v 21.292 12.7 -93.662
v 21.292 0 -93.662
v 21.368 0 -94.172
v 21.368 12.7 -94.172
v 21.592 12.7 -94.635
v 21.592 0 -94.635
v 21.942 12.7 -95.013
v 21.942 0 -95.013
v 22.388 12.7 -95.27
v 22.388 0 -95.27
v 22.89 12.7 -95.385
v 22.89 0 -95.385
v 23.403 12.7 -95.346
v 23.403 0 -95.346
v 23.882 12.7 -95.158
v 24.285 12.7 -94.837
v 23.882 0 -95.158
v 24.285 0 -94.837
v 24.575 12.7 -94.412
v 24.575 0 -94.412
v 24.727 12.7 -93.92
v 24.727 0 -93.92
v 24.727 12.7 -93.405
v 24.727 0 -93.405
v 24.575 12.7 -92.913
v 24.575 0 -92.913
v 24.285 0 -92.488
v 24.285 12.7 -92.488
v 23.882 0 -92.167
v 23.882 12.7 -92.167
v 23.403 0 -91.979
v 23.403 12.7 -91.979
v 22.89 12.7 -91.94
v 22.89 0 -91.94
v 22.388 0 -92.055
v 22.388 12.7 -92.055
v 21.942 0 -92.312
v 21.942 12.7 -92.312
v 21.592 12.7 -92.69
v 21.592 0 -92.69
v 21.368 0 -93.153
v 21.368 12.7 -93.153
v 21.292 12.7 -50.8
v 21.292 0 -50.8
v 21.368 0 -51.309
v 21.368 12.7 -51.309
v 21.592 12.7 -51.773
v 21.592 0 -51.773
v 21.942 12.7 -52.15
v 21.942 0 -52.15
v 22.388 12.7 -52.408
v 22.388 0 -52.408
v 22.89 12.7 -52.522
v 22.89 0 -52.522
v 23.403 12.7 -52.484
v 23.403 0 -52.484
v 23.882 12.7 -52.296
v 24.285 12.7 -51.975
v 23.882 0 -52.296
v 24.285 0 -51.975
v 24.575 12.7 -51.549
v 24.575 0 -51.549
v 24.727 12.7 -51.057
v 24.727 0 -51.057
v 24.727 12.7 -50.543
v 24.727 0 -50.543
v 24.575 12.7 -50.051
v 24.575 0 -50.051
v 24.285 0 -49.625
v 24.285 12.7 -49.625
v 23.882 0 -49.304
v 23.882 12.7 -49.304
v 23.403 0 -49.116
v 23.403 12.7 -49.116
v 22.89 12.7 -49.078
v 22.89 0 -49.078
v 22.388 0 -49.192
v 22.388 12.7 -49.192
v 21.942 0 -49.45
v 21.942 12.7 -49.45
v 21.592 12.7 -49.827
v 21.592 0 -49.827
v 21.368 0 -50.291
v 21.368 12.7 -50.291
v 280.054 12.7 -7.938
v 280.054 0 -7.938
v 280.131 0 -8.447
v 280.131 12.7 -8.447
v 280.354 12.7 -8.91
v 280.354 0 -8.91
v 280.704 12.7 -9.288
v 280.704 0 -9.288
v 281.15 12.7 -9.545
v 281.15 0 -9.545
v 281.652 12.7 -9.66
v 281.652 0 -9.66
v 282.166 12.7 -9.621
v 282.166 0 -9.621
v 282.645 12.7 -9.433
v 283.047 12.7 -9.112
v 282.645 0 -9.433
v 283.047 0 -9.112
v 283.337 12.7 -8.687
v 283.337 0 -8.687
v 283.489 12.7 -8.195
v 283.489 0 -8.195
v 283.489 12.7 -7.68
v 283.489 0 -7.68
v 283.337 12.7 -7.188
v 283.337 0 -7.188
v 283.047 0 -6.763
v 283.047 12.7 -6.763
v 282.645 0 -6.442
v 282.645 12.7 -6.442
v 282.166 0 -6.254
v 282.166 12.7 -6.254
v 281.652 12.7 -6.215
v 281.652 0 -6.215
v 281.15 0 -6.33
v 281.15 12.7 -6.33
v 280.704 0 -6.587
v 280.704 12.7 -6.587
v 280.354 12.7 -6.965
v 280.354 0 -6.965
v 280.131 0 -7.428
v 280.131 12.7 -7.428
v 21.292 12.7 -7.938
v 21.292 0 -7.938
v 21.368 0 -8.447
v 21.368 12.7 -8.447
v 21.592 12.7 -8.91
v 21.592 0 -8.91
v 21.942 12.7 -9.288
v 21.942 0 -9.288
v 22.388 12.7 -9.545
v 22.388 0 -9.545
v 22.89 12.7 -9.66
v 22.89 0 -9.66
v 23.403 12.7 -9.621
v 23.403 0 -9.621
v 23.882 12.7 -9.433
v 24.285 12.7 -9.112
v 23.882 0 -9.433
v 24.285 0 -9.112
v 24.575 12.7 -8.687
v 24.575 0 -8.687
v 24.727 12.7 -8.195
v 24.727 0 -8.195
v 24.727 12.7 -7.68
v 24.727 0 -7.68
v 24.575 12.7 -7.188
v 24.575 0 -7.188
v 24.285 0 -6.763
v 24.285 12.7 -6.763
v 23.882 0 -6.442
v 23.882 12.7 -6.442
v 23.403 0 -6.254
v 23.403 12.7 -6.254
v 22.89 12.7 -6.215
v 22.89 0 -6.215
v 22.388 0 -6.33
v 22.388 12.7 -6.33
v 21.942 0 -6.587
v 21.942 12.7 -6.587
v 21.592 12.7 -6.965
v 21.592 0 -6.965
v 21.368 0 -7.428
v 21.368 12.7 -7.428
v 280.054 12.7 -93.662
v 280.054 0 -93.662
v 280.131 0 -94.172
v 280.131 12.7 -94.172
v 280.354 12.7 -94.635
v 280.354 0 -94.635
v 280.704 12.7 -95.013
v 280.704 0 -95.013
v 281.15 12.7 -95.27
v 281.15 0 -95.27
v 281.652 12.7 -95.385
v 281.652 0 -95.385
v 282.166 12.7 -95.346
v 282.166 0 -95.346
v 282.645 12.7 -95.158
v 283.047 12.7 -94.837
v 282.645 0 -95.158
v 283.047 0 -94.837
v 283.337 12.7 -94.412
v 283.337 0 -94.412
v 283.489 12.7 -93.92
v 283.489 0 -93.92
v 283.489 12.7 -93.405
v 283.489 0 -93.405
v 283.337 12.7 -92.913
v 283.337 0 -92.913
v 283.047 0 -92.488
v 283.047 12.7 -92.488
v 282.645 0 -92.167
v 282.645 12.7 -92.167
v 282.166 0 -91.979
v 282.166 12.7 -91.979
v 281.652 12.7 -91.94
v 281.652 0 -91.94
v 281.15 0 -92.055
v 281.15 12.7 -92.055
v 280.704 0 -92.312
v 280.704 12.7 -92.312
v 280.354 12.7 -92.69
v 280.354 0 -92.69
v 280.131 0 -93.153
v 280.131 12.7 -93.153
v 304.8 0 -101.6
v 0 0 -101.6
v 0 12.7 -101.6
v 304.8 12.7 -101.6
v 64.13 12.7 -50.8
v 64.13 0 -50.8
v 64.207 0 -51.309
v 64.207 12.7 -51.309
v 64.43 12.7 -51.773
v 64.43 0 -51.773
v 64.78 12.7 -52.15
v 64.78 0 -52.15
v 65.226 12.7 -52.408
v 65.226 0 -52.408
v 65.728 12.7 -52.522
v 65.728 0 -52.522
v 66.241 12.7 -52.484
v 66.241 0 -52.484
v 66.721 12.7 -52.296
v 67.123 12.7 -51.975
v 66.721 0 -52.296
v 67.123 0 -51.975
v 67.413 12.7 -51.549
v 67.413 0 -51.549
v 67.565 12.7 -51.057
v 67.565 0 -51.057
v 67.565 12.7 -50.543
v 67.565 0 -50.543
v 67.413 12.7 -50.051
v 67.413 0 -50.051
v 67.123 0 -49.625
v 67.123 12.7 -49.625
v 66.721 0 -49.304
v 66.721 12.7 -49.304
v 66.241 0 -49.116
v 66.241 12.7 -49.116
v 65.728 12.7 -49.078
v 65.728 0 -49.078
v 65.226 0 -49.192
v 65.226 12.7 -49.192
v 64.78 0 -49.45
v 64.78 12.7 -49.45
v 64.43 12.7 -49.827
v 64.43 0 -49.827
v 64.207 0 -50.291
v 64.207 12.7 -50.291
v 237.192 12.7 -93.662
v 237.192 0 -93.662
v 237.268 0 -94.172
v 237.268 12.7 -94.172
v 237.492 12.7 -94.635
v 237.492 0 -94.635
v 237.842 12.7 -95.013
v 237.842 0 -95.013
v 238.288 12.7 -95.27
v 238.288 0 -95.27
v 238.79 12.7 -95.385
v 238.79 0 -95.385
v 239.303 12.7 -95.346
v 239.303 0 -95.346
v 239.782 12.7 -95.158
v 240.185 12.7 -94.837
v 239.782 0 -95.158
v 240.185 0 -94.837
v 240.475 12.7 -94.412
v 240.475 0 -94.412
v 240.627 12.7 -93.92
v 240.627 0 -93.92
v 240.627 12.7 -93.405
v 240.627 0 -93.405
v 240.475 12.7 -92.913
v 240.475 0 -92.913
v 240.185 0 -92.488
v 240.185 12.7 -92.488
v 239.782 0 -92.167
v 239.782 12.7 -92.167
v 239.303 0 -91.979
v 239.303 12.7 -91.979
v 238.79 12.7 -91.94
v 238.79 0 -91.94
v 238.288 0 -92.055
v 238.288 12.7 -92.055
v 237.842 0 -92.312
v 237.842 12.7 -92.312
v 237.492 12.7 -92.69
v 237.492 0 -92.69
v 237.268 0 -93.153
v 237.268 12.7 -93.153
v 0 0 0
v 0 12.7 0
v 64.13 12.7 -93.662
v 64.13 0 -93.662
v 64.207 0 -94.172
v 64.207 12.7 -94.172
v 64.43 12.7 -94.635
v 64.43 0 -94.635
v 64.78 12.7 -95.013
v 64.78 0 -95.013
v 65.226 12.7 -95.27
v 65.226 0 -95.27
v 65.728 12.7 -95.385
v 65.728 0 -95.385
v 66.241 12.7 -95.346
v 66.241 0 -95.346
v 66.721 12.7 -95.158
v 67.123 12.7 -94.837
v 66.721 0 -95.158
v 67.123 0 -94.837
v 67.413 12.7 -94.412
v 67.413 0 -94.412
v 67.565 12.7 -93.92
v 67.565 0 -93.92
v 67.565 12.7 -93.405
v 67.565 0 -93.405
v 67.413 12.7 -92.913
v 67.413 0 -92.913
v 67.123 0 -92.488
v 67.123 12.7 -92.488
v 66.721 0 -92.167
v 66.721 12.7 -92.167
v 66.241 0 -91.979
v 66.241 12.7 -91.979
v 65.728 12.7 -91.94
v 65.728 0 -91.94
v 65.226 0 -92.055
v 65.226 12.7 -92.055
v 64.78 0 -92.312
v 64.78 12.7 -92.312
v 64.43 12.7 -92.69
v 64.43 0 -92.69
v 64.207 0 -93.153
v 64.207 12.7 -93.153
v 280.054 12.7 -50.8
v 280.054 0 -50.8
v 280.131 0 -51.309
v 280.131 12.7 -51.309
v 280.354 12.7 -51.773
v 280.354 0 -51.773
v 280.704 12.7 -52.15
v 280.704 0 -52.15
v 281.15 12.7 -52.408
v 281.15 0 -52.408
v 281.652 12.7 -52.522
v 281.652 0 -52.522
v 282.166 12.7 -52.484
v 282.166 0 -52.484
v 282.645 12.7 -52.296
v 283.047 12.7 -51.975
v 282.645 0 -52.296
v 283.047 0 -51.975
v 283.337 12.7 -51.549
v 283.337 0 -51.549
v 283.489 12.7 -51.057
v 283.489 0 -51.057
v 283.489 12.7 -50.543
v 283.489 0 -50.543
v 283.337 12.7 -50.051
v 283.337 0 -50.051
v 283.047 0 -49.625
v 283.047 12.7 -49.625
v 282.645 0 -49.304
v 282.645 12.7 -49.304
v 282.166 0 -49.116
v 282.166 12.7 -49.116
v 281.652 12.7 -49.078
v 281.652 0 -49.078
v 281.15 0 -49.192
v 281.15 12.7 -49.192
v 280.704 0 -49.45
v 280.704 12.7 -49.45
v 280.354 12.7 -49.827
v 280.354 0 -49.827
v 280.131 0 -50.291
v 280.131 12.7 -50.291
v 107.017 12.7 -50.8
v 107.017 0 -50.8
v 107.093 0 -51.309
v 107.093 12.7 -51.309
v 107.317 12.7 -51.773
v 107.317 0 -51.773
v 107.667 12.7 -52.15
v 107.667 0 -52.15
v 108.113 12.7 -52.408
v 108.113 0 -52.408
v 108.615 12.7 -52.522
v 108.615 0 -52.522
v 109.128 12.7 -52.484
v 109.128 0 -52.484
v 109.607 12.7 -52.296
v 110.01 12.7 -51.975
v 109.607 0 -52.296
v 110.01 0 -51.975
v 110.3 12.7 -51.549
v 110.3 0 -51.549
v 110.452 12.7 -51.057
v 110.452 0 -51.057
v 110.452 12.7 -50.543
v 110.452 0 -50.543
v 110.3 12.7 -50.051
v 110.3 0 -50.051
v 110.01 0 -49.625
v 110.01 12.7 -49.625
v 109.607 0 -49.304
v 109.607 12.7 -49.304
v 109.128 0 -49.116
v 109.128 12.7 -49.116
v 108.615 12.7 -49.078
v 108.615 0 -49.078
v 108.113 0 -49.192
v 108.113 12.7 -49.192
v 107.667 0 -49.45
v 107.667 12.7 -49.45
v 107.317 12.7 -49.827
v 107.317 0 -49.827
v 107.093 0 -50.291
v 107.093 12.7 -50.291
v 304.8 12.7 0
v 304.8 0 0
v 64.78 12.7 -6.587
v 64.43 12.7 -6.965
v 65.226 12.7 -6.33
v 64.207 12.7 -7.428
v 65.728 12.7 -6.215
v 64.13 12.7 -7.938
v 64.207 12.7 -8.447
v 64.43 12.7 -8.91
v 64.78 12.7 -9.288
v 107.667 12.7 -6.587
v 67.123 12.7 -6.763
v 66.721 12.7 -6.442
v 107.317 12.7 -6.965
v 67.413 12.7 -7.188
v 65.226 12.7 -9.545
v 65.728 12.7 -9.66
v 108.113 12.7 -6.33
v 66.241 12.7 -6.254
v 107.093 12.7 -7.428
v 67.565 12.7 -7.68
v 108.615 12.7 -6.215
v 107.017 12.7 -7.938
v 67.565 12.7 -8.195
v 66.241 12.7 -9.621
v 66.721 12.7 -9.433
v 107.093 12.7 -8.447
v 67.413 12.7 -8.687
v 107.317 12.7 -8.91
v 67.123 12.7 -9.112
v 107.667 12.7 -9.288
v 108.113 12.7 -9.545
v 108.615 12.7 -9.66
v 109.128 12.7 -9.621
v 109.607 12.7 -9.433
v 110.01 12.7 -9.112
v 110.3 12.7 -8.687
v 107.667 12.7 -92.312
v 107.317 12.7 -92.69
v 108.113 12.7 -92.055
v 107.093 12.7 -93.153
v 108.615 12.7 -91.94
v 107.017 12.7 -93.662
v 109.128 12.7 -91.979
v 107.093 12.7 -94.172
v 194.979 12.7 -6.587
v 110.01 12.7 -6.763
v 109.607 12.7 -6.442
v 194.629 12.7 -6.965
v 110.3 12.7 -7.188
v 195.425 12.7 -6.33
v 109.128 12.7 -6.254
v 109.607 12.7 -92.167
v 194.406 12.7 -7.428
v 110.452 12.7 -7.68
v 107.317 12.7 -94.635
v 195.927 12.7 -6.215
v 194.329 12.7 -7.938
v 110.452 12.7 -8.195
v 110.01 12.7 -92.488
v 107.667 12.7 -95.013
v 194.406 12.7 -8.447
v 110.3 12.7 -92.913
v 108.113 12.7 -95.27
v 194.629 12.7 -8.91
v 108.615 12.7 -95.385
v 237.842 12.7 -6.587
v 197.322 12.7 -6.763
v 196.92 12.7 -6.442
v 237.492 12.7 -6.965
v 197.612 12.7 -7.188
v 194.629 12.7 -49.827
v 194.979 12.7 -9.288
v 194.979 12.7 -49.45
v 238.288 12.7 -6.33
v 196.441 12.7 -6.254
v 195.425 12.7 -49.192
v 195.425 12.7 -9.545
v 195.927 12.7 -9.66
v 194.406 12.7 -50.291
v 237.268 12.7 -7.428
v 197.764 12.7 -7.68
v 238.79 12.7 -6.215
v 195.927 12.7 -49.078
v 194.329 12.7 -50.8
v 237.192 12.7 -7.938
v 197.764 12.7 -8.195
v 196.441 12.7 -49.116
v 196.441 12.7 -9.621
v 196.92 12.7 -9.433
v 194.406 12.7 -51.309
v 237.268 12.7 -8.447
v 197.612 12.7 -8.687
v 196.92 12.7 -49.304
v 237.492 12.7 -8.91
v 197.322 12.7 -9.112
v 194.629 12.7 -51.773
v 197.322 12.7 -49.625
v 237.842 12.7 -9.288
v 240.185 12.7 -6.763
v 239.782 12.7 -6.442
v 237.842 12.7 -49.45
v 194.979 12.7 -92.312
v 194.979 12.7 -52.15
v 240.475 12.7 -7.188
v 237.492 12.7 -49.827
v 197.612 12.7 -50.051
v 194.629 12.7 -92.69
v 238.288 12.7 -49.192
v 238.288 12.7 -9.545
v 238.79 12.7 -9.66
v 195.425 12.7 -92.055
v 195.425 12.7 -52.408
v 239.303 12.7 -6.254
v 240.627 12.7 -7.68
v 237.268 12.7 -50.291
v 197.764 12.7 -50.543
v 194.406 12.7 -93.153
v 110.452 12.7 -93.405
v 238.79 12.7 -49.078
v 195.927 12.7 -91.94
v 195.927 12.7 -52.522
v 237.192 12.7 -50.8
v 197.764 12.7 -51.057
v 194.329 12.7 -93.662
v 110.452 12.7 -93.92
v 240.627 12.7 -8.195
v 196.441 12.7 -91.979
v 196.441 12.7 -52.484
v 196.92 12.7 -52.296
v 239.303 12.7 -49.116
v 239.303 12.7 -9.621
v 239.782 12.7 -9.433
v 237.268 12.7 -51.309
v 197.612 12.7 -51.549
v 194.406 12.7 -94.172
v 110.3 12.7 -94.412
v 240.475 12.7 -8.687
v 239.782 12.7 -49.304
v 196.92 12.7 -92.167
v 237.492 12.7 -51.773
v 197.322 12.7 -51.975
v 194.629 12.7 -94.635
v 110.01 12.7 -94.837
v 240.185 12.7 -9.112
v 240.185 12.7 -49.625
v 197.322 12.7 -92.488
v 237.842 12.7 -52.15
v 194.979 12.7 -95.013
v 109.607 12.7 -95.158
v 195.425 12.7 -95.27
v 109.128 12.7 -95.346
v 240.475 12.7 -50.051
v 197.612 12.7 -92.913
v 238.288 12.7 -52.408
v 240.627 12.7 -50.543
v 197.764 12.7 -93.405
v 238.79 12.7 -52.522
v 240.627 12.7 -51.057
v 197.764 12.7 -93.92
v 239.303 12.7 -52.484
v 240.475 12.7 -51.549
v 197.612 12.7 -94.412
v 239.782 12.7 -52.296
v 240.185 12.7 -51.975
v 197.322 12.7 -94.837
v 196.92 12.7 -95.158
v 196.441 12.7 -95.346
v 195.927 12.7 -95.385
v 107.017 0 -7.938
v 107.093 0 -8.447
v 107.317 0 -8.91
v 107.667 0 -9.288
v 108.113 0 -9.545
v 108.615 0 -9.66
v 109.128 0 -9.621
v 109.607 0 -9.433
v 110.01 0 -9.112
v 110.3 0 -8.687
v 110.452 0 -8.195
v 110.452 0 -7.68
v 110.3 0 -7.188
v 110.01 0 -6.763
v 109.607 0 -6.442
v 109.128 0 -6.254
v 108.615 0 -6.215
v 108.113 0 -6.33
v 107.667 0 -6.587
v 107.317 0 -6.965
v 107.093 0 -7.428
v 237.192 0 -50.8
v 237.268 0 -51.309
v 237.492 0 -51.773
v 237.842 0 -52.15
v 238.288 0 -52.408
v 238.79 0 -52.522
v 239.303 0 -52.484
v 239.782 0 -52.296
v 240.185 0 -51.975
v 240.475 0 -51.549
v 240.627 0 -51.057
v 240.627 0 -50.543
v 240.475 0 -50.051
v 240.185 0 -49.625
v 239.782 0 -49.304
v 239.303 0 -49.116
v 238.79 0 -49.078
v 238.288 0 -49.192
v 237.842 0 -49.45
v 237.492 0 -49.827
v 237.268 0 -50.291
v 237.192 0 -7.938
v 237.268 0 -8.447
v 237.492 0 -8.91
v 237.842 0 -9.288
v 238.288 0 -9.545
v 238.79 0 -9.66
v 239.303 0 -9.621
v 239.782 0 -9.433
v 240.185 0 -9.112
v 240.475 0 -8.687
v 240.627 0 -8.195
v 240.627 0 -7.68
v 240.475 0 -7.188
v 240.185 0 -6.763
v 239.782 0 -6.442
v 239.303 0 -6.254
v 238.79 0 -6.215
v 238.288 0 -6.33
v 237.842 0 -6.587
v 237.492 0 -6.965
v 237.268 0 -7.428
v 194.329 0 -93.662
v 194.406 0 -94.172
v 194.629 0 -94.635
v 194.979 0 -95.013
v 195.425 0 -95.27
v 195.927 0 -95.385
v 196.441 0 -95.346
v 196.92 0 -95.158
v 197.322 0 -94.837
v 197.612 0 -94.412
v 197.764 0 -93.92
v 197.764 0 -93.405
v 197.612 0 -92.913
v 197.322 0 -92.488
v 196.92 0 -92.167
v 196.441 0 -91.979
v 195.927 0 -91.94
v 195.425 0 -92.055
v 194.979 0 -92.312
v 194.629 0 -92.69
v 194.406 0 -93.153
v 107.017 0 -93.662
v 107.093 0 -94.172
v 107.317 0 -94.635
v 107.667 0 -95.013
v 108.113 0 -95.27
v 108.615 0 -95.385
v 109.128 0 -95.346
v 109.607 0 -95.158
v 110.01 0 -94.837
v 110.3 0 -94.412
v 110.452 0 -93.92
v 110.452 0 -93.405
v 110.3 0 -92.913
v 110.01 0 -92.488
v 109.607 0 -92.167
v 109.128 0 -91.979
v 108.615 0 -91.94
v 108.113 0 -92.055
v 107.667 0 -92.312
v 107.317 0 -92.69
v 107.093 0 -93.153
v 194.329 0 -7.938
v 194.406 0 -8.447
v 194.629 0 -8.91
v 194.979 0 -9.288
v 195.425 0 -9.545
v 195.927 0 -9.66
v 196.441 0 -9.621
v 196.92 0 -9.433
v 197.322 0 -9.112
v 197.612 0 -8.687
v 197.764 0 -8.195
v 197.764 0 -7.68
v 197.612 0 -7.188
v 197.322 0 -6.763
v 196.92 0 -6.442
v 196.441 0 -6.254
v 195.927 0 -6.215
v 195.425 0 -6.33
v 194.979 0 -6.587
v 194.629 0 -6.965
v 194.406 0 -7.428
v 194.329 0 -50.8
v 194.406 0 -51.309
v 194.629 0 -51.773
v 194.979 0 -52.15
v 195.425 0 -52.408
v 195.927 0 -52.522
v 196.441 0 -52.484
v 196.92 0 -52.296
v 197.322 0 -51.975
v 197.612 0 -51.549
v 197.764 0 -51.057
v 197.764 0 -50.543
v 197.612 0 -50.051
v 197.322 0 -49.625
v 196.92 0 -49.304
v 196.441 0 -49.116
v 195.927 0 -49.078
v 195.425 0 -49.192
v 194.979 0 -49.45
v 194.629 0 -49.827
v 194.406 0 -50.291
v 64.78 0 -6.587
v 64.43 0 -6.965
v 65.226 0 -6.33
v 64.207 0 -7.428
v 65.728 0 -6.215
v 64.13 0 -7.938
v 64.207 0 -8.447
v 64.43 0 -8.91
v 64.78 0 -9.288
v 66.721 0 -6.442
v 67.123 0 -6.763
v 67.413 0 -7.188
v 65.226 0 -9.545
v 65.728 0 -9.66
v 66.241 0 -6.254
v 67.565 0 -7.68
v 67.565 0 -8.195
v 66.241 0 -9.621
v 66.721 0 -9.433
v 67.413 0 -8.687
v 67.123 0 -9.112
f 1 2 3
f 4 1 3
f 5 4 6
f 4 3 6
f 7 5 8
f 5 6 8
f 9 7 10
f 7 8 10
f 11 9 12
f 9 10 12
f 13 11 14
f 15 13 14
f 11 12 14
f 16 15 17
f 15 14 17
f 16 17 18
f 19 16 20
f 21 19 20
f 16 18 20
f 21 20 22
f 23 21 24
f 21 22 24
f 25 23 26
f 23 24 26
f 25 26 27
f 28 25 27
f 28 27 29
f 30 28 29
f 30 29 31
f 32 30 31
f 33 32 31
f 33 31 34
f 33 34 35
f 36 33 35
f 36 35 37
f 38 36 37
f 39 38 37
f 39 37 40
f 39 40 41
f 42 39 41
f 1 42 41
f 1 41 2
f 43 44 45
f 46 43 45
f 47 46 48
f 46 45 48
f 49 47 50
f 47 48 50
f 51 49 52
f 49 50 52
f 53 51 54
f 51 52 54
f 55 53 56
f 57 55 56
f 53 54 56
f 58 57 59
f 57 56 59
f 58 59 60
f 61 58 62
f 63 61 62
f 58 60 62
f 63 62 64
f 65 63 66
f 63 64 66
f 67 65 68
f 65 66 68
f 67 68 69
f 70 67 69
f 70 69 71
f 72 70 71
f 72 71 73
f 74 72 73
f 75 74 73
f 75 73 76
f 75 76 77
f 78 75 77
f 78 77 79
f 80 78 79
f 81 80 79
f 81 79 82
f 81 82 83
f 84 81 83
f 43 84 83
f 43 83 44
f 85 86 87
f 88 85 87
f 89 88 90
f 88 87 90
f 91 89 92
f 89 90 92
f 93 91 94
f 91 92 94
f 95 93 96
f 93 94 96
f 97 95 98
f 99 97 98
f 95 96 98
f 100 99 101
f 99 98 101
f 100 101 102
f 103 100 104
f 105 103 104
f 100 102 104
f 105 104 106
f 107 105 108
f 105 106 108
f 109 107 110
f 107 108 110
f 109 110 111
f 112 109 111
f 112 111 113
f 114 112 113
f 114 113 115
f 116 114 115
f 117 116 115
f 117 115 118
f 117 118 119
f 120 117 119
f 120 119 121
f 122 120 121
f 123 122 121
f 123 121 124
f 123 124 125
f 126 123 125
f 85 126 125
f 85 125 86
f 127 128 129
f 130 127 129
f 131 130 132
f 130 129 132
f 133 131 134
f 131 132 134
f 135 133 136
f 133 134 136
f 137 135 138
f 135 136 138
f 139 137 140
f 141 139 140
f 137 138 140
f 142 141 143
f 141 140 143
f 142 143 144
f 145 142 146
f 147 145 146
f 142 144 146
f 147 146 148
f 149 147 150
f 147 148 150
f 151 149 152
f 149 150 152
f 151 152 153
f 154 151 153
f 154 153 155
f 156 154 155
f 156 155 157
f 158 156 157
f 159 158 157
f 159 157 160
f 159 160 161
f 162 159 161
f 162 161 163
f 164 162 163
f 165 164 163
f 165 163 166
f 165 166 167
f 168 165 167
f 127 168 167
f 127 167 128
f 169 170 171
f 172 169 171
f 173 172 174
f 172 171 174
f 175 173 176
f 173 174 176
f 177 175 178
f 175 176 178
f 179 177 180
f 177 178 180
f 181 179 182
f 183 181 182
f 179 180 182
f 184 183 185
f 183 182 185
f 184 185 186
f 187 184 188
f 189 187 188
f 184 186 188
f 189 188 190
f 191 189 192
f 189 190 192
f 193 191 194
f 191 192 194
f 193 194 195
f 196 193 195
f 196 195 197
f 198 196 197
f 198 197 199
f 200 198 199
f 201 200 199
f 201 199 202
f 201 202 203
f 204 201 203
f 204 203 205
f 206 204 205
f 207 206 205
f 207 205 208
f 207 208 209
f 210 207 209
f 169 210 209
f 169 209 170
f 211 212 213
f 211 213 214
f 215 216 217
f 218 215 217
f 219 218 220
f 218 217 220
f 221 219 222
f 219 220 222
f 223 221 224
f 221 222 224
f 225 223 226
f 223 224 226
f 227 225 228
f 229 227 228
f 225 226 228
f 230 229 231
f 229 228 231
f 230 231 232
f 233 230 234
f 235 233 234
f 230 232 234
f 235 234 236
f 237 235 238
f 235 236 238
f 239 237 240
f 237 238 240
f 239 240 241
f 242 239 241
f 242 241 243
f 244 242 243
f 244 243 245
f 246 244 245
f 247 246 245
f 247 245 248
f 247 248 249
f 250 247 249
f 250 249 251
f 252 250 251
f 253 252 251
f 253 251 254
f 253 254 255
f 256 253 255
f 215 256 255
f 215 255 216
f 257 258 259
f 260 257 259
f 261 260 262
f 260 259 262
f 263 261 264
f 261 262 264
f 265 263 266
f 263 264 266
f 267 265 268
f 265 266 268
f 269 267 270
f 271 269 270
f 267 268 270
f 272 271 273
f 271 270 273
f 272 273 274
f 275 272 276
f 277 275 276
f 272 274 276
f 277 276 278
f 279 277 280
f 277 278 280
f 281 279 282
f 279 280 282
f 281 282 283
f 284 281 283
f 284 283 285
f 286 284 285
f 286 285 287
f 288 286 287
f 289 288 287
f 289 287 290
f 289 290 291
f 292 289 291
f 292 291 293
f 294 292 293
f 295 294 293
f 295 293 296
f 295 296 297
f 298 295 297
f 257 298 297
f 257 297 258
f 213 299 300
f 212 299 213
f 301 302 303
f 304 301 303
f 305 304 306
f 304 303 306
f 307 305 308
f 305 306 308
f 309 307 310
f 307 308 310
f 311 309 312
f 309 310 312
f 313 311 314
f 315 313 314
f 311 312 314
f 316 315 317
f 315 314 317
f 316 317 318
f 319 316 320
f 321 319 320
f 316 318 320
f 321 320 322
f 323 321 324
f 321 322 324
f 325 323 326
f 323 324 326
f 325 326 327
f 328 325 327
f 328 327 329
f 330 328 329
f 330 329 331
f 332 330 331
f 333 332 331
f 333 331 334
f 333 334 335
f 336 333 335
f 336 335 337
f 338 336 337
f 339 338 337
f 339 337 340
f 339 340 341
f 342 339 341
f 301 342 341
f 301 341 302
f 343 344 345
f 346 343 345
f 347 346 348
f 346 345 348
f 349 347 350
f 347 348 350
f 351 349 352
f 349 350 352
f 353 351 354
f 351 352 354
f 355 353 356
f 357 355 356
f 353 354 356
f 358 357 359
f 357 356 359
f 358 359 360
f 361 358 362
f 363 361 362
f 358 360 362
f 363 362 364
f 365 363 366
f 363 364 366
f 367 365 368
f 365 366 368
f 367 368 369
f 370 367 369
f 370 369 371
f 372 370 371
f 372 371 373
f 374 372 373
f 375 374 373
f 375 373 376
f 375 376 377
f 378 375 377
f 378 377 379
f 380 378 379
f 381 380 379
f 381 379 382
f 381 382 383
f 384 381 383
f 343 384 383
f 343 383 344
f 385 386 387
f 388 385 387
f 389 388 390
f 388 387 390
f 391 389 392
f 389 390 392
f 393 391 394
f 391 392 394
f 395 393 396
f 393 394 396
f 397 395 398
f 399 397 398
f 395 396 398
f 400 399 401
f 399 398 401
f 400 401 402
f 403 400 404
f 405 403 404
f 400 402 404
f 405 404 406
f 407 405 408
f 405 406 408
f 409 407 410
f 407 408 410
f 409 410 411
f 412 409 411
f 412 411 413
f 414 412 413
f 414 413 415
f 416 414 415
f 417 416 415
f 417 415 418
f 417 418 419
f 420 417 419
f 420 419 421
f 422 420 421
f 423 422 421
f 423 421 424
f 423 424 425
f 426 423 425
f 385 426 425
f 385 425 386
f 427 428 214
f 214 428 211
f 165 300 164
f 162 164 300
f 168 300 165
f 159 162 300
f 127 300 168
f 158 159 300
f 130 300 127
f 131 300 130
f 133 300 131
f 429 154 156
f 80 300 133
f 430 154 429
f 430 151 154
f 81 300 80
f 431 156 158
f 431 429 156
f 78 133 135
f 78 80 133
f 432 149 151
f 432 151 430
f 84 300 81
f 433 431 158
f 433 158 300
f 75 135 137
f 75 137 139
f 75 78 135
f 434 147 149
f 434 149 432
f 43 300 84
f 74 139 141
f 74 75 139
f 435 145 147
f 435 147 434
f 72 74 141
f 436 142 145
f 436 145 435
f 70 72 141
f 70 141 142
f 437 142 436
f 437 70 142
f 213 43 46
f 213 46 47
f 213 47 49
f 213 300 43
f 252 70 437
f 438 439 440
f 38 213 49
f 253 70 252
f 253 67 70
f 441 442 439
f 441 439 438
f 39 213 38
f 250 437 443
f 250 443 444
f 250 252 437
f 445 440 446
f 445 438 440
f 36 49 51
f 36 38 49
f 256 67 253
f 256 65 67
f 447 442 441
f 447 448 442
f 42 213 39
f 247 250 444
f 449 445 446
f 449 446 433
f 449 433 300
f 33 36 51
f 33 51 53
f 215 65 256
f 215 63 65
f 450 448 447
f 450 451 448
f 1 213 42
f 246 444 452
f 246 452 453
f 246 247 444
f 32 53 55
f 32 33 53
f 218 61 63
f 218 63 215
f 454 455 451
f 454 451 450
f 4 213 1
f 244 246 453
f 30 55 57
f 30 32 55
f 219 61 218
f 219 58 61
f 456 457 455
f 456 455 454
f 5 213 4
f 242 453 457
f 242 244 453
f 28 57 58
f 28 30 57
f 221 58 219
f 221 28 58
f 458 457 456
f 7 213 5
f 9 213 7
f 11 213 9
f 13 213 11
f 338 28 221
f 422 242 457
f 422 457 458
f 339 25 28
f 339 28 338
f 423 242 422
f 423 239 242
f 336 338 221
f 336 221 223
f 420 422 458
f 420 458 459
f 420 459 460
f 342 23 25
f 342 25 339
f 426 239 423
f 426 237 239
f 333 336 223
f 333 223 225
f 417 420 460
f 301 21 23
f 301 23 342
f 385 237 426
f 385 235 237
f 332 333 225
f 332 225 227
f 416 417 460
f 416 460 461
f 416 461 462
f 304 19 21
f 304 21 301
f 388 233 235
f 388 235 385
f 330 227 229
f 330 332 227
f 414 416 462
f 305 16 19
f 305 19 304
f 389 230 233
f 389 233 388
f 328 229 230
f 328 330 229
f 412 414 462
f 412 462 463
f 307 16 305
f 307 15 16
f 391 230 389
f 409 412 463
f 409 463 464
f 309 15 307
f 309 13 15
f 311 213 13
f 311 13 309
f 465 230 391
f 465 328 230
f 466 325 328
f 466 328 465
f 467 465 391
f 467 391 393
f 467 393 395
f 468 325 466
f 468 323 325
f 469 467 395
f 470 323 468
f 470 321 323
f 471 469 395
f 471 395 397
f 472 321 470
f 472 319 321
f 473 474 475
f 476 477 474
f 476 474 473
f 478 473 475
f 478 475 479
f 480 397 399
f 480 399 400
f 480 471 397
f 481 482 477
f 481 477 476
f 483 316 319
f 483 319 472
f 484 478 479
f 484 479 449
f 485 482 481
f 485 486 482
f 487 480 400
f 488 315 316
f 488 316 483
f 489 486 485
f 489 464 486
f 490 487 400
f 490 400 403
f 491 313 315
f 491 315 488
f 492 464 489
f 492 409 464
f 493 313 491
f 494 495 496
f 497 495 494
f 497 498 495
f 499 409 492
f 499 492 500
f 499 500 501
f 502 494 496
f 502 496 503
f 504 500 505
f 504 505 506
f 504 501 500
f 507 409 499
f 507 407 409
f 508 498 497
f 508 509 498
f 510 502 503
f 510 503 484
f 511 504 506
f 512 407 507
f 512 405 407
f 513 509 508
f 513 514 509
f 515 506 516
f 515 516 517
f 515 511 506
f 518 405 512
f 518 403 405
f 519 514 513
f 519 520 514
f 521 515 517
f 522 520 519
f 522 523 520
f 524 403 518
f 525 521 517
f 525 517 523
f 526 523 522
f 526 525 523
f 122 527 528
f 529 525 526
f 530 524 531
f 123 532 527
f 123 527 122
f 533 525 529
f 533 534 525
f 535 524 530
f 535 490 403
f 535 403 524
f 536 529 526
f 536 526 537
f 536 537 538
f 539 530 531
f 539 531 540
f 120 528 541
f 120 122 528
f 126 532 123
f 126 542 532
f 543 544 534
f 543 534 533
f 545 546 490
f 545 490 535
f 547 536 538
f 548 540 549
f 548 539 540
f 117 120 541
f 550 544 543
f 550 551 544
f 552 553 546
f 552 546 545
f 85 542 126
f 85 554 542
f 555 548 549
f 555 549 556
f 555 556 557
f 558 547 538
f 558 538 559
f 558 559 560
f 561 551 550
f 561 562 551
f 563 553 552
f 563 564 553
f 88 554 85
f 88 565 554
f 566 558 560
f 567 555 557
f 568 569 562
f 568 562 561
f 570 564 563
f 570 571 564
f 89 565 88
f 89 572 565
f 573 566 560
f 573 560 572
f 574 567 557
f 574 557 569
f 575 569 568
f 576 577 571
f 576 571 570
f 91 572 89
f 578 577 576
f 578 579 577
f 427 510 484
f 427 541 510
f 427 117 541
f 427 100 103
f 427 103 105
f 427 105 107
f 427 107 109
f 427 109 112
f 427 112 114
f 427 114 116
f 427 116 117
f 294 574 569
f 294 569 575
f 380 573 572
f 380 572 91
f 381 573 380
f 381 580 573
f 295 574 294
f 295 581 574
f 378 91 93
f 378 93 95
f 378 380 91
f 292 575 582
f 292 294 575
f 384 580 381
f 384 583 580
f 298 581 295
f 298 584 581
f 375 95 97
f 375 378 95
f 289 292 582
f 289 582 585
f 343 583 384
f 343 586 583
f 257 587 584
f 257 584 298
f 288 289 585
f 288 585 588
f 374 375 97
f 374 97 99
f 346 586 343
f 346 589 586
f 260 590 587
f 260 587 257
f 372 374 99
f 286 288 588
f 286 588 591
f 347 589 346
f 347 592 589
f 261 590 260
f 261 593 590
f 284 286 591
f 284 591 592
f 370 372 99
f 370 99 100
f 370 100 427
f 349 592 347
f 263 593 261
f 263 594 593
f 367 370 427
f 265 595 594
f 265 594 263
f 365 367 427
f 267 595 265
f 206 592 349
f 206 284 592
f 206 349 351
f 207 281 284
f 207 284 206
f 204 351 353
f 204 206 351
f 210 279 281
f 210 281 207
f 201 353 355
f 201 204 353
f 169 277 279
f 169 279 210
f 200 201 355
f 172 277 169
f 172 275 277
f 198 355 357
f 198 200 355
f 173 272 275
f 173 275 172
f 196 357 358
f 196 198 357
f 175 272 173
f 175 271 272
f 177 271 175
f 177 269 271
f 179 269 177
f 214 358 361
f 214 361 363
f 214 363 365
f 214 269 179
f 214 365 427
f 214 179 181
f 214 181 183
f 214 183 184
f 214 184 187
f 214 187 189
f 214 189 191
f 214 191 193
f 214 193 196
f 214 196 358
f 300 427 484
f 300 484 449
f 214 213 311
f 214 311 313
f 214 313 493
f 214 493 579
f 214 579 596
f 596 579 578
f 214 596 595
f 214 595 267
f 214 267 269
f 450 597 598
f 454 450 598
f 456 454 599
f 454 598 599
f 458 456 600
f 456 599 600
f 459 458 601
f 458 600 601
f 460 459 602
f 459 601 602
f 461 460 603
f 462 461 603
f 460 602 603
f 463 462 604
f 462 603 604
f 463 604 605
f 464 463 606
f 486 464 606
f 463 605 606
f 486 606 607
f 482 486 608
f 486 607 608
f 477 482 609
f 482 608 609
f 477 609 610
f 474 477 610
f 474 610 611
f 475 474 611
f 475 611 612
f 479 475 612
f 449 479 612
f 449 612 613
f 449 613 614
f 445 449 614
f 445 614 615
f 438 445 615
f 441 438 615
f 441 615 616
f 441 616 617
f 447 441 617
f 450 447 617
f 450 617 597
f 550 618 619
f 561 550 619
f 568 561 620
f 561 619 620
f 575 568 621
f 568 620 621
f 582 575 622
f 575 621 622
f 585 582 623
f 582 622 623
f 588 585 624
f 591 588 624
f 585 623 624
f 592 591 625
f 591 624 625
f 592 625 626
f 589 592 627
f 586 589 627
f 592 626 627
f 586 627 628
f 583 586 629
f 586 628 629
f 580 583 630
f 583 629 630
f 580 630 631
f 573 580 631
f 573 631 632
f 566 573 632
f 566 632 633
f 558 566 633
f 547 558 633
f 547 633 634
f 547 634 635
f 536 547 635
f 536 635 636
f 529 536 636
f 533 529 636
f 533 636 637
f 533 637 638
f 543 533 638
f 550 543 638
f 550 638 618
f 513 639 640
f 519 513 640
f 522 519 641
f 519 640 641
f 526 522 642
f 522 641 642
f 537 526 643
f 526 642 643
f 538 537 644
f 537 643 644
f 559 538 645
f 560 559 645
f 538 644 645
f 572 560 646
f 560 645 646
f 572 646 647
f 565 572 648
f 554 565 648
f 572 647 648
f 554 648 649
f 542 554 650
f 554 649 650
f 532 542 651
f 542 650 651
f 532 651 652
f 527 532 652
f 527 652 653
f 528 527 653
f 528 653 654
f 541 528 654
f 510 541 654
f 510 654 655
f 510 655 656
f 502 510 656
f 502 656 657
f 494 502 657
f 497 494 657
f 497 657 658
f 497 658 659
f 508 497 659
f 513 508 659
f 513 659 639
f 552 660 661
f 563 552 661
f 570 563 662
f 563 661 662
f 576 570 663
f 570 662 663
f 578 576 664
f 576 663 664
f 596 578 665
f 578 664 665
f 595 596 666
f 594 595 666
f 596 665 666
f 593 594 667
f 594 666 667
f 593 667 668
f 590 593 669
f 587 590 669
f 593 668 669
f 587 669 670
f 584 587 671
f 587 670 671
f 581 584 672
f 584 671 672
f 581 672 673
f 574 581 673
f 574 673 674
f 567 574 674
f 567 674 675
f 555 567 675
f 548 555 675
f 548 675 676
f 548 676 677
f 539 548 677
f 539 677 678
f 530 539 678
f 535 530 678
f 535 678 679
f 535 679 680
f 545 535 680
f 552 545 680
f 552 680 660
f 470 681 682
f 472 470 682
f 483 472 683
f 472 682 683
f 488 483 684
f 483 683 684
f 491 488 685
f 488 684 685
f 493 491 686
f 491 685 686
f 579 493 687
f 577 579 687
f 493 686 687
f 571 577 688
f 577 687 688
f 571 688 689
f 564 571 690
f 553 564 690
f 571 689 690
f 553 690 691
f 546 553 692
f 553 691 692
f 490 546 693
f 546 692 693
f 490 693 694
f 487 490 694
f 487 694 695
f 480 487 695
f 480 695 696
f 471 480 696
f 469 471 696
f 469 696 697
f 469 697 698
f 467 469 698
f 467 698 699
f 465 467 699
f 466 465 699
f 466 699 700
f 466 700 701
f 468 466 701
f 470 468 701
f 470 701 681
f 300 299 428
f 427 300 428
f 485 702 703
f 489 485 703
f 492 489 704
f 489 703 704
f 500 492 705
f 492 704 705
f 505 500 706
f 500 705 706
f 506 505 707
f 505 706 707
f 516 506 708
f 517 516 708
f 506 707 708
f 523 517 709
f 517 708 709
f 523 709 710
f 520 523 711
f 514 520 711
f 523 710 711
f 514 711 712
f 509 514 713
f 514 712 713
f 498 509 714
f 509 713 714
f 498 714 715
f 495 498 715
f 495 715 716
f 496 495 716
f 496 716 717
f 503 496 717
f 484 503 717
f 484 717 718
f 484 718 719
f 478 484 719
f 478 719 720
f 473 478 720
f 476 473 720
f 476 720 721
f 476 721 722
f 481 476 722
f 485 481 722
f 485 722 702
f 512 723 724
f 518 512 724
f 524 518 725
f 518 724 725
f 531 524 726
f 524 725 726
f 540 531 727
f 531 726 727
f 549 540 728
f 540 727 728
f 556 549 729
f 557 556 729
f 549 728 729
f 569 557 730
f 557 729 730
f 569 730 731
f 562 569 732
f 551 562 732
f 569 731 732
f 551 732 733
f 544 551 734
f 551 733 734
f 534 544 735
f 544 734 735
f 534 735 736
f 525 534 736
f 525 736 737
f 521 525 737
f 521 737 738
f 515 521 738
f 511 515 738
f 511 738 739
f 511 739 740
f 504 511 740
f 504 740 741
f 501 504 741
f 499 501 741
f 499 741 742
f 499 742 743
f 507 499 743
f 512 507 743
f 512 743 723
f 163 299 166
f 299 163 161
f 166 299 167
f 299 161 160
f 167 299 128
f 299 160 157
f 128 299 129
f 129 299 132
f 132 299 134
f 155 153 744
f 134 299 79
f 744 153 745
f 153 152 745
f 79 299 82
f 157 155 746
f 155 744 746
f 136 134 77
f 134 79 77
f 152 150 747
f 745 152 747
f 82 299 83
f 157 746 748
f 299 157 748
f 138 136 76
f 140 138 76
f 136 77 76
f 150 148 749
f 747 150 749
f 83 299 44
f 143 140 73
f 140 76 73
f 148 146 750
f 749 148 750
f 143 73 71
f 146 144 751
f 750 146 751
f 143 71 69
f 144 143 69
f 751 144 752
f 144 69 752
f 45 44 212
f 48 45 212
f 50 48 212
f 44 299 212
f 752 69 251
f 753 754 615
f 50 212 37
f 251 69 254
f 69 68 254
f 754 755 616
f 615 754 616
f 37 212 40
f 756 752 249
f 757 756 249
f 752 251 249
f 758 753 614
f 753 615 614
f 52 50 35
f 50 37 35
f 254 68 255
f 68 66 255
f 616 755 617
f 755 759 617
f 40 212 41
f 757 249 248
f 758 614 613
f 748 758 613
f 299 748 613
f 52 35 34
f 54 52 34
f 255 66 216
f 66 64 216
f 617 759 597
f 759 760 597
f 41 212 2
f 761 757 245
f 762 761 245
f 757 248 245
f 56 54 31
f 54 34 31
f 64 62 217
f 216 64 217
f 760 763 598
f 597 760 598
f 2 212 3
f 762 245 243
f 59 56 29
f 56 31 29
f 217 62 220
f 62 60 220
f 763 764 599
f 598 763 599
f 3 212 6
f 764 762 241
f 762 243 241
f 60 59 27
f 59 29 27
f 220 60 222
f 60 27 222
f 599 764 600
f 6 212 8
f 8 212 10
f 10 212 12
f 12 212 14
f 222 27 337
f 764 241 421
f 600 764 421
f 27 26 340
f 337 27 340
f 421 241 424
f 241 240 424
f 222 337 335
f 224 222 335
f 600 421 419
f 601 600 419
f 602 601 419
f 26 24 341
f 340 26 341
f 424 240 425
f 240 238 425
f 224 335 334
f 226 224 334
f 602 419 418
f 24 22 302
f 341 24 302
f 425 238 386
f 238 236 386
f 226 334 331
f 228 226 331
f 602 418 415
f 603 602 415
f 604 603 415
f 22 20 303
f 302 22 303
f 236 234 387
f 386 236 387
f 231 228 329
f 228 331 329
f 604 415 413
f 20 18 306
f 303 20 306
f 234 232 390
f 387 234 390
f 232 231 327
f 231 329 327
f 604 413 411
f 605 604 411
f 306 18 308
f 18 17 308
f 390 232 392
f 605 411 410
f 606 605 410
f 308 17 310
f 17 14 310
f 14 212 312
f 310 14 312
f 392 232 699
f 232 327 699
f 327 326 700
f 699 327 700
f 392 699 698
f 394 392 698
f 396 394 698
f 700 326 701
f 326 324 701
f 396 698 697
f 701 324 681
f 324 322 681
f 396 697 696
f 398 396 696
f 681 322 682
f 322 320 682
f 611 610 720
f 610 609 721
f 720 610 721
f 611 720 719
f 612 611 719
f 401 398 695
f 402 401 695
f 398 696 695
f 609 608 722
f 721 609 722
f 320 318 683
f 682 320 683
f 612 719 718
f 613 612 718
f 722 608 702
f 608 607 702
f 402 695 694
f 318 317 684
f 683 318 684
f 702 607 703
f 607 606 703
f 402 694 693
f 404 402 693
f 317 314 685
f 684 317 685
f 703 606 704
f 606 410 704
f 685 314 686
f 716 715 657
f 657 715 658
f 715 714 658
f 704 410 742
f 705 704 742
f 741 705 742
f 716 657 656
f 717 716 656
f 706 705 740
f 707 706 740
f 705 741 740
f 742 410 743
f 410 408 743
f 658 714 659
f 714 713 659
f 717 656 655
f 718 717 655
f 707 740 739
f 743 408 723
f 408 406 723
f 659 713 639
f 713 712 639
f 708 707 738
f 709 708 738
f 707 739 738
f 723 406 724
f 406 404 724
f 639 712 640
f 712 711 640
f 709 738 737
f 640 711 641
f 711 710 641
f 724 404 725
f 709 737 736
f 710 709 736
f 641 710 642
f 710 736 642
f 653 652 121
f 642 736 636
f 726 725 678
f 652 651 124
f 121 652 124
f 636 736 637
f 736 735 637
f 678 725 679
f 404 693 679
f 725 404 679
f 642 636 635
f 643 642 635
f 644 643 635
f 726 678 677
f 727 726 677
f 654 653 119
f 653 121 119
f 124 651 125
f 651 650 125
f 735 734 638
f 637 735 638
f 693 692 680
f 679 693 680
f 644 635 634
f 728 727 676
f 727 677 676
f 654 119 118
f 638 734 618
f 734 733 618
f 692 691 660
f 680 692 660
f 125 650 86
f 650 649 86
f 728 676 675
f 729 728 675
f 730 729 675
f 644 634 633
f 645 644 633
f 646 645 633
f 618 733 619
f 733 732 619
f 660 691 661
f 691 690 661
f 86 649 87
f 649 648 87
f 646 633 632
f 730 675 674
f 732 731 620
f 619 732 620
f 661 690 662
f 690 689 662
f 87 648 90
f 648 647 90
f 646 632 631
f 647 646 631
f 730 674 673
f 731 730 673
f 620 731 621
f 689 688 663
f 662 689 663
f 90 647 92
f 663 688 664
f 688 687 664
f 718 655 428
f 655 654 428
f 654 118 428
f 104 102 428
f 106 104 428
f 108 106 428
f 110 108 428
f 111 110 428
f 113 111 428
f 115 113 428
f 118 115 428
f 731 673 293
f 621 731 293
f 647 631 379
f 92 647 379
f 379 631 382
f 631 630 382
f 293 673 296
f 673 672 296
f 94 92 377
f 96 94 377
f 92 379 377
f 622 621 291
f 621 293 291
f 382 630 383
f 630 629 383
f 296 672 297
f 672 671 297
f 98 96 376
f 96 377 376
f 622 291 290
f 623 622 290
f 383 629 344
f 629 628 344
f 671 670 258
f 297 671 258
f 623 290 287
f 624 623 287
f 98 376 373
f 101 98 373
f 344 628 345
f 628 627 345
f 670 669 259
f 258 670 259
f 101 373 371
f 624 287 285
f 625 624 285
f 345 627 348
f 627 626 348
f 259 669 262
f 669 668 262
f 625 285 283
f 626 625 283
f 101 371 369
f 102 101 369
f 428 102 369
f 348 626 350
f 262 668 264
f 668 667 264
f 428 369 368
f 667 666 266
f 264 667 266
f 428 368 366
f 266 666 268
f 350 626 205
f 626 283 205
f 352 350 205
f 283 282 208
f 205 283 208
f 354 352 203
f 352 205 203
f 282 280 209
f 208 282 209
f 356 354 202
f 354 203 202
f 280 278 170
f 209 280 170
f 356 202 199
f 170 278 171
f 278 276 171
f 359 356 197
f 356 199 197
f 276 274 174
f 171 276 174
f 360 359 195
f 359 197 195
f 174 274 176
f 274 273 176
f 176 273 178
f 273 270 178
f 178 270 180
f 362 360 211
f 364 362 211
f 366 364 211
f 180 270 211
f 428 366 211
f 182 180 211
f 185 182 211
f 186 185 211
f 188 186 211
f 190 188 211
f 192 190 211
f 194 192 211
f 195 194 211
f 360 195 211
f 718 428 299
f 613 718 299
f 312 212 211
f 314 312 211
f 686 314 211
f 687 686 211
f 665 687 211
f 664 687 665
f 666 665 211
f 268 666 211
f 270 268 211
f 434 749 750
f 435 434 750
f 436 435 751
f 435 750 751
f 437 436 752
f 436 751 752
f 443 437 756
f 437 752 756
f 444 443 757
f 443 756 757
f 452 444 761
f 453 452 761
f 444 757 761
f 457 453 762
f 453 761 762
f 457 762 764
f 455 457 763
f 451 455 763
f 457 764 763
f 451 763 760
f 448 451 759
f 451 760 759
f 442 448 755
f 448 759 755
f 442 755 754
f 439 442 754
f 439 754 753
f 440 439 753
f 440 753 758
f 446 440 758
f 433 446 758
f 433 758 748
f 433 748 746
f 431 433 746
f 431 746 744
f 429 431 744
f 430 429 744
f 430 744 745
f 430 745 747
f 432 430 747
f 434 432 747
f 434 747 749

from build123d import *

# Parameters (mm, degrees)
SKETCH1_W             = 304.8
SKETCH1_H             = 101.6
BOSS_EXTRUDE1_DEPTH   = 12.7
F_8_32_TAPPED_HOLE1_D = 3.4544


with BuildPart() as part:
    # Sketch1 → Boss-Extrude1 (new body)
    with BuildSketch(Plane(origin=(0, 0, 0), x_dir=(1, 0, 0), z_dir=(0, 1, 0))):
        with Locations((152.4, 50.8)):
            Rectangle(SKETCH1_W, SKETCH1_H)
    extrude(amount=BOSS_EXTRUDE1_DEPTH)

    # #8-32 Tapped Hole1 (through all)
    with Locations(Plane(origin=(0, 12.7, 0), x_dir=(1, 0, 0), z_dir=(0, 1, 0))):
        with Locations((23.01875, 93.6625), (65.857160482, 93.6625), (108.74375, 93.6625), (196.05625, 93.6625), (238.91875, 93.6625), (281.78125, 93.6625), (23.01875, 50.8), (65.857160482, 50.8), (108.74375, 50.8), (196.05625, 50.8), (238.91875, 50.8), (281.78125, 50.8), (23.01875, 7.9375), (65.857160482, 7.9375), (108.74375, 7.9375), (196.05625, 7.9375), (238.91875, 7.9375), (281.78125, 7.9375)):
            Hole(F_8_32_TAPPED_HOLE1_D / 2)


solid = part.part
